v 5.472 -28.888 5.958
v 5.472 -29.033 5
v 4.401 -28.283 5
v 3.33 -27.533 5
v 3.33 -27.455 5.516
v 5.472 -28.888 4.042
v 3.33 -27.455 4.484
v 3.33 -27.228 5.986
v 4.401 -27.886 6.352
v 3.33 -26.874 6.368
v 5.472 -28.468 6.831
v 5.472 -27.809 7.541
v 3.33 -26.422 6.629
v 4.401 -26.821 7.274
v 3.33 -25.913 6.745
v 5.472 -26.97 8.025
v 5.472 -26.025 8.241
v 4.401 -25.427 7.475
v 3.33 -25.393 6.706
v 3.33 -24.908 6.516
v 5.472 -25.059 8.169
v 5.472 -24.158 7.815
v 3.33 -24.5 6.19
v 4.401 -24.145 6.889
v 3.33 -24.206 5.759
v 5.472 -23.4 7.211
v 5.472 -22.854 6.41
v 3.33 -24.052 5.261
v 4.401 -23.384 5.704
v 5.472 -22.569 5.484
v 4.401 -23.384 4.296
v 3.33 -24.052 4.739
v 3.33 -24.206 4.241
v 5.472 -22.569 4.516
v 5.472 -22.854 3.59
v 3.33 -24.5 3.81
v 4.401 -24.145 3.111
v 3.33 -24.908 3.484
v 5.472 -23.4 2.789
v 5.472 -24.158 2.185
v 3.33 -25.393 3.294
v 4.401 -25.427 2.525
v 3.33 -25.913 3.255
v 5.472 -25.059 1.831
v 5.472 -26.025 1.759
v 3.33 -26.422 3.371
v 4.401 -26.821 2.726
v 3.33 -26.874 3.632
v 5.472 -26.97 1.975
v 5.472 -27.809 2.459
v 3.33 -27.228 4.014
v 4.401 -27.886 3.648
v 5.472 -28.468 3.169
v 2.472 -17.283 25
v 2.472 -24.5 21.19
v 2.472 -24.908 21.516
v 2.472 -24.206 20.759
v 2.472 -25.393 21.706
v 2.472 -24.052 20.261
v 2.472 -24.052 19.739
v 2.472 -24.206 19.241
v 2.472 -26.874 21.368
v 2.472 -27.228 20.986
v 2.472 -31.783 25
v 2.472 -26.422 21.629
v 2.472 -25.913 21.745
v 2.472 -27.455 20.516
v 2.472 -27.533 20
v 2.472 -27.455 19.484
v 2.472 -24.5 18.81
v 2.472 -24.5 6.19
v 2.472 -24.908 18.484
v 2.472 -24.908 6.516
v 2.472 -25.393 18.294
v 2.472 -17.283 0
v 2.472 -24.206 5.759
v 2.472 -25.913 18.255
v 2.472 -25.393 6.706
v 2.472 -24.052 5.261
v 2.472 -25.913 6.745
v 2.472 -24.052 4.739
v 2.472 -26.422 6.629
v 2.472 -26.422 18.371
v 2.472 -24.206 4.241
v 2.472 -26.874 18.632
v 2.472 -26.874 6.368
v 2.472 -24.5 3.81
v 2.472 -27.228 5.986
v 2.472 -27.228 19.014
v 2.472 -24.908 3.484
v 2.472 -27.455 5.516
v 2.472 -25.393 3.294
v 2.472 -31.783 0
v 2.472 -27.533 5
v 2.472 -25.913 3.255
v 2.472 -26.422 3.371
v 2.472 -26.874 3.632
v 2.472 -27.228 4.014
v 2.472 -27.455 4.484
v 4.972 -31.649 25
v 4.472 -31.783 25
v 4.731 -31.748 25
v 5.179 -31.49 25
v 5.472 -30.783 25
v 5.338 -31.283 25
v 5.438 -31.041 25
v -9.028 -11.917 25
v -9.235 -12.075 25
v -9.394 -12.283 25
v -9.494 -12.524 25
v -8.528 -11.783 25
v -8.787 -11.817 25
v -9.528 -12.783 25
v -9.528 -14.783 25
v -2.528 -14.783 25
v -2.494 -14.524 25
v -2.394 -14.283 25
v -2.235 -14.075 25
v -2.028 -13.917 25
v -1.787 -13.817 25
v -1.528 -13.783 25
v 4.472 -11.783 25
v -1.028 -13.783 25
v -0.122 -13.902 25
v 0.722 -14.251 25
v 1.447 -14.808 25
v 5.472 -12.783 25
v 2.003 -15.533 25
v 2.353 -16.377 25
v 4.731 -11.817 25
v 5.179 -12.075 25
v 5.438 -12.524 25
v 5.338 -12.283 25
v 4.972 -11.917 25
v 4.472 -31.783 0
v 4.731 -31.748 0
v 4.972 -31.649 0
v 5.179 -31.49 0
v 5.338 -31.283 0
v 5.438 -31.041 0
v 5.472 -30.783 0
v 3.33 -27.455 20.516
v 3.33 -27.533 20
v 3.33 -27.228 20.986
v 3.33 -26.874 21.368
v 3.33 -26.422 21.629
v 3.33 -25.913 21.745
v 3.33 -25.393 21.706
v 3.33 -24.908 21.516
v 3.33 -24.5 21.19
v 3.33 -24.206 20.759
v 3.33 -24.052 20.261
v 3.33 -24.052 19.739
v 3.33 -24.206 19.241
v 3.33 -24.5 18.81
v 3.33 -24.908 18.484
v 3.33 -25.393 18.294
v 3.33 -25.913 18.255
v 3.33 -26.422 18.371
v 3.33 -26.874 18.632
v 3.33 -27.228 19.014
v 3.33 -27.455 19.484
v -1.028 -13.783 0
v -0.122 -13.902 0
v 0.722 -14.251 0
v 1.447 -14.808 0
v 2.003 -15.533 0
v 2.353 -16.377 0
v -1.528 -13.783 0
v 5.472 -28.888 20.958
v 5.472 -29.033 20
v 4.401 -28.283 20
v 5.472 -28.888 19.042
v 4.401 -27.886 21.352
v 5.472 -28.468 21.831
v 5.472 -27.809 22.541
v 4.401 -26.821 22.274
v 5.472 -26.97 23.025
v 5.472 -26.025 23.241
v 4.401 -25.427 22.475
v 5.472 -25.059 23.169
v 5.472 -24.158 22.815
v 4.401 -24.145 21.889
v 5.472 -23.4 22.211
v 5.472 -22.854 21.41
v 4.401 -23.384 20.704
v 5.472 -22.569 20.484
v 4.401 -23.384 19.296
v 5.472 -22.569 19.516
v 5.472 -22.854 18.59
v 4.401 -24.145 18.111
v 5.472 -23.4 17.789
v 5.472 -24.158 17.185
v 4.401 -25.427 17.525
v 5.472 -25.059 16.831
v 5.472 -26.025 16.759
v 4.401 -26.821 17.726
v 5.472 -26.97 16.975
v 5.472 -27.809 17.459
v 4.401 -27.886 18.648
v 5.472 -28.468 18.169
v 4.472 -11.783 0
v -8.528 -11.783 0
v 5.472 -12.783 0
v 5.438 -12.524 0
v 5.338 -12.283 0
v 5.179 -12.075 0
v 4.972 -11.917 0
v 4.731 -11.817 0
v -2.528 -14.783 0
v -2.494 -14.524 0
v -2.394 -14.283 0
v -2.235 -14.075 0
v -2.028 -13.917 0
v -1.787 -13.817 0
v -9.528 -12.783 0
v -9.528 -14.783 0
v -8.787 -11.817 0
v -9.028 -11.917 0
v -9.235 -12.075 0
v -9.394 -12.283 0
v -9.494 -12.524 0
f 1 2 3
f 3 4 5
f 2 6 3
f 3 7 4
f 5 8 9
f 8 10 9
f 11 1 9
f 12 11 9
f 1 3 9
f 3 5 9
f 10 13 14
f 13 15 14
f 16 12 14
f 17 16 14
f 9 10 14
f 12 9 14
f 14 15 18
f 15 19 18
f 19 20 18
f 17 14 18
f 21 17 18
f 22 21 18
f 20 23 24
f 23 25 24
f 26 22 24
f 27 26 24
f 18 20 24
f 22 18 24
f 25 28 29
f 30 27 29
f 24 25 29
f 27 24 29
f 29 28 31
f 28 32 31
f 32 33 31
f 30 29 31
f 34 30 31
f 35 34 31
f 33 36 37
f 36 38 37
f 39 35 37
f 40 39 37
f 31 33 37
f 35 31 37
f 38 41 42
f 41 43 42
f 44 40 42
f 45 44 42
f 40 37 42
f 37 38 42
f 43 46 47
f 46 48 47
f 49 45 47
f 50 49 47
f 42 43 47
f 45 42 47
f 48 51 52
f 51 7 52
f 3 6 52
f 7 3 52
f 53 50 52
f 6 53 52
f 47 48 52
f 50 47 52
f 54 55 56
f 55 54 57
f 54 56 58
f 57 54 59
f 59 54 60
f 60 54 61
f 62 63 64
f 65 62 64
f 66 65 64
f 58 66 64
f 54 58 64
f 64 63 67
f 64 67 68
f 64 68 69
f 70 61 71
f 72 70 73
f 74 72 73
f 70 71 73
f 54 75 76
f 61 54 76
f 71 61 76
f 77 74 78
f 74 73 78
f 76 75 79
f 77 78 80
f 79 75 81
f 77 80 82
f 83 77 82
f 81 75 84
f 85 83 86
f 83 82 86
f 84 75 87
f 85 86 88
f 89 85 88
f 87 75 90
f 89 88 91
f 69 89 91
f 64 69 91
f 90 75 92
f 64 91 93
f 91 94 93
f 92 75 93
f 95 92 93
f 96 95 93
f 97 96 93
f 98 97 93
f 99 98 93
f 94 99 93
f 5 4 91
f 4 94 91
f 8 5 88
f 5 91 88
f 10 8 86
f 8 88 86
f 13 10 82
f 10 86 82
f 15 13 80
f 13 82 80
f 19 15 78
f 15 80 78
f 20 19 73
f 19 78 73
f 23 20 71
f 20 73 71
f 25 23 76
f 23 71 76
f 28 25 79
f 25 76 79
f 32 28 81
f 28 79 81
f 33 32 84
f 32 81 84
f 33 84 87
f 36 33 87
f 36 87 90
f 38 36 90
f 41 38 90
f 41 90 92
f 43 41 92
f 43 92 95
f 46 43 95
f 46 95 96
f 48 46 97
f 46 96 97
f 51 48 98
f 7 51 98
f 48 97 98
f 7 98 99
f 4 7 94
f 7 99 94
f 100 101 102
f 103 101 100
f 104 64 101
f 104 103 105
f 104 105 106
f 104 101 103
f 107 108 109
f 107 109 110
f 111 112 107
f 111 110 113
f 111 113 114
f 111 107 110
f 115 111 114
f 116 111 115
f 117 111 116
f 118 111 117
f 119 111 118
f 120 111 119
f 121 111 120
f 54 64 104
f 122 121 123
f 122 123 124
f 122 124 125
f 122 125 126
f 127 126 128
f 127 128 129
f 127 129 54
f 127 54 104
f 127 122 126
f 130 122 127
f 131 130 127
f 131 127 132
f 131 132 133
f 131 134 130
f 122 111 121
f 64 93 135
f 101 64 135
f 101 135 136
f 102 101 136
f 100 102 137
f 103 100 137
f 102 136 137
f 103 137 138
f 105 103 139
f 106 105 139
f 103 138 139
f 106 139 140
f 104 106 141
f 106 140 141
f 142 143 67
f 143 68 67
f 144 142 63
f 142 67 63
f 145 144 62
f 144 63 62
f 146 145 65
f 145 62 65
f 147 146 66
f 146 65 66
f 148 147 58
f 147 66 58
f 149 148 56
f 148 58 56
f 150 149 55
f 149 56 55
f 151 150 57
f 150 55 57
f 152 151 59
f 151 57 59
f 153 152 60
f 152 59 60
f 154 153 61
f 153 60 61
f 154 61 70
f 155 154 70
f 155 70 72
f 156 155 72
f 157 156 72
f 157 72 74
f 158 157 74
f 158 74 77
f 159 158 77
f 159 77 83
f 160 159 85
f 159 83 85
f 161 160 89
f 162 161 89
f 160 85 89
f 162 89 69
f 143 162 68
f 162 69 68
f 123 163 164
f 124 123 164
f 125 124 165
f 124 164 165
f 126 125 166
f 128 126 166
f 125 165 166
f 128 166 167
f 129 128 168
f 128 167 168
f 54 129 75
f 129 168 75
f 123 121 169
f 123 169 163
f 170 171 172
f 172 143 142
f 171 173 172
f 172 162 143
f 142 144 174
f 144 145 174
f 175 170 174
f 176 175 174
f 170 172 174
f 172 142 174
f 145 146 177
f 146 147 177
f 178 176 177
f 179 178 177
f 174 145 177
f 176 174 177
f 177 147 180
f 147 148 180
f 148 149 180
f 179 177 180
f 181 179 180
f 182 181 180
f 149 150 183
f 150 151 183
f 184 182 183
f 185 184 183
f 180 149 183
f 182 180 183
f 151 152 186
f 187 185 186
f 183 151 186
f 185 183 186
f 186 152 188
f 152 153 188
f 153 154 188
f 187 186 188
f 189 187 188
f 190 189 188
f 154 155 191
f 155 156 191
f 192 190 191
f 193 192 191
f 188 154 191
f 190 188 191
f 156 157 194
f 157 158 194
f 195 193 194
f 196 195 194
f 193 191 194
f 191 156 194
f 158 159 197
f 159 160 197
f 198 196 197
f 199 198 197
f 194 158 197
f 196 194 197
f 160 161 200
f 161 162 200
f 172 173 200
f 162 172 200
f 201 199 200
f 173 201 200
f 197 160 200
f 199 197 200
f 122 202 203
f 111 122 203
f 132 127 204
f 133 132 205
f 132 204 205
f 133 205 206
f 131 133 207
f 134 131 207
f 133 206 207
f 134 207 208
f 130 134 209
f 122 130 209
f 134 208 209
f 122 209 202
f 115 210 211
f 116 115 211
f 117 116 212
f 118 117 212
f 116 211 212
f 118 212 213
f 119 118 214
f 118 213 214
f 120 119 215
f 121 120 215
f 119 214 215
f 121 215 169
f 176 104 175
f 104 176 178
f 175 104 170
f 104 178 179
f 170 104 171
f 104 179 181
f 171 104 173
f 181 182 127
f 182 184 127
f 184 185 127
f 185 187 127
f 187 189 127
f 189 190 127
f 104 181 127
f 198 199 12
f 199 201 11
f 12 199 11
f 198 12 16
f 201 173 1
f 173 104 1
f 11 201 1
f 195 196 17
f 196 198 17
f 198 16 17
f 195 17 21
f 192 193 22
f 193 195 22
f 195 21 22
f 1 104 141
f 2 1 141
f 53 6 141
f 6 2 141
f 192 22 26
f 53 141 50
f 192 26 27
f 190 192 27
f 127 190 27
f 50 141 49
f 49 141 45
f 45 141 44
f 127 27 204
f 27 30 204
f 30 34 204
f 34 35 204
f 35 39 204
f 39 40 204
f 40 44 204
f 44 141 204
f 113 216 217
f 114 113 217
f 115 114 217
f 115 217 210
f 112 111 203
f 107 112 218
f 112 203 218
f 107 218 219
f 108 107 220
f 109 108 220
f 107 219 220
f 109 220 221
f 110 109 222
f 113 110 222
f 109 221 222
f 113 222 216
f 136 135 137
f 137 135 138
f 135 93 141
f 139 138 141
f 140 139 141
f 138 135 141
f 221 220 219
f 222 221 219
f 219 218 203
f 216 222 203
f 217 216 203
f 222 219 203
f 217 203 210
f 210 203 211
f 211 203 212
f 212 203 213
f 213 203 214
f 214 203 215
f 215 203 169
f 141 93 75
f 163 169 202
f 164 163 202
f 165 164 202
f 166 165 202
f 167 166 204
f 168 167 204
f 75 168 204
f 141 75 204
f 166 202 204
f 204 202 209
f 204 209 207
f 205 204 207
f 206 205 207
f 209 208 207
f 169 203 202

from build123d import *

# Parameters (mm, degrees)
F1_DEPTH       = 25
F3_D           = 3.5
F3_CSINK_D     = 6.5
F3_CSINK_ANGLE = 70


with BuildPart() as f1:
    # F0 (on Top) → F1 (new body)
    with BuildSketch(Plane.XY):
        with BuildLine():
            Line((4.472217, -11.782544), (-8.527783, -11.782544))
            ThreePointArc((-8.527783, -11.782544), (-9.23489, -12.075437), (-9.527783, -12.782544))
            Line((-9.527783, -12.782544), (-9.527783, -14.782544))
            Line((-9.527783, -14.782544), (-2.527783, -14.782544))
            ThreePointArc((-2.527783, -14.782544), (-2.23489, -14.075437), (-1.527783, -13.782544))
            Line((-1.527783, -13.782544), (-1.027783, -13.782544))
            ThreePointArc((-1.027783, -13.782544), (1.447091, -14.80767), (2.472217, -17.282544))
            Line((2.472217, -17.282544), (2.472217, -31.782544))
            Line((2.472217, -31.782544), (4.472217, -31.782544))
            ThreePointArc((4.472217, -31.782544), (5.179324, -31.489651), (5.472217, -30.782544))
            Line((5.472217, -30.782544), (5.472217, -12.782544))
            ThreePointArc((5.472217, -12.782544), (5.179324, -12.075437), (4.472217, -11.782544))
        make_face()
    extrude(amount=F1_DEPTH)

    # F3 (through all)
    with Locations(Plane.YZ.offset(5.472217)):
        with Locations((-25.782544, 20), (-25.782544, 5)):
            CounterSinkHole(F3_D / 2, F3_CSINK_D / 2, counter_sink_angle=F3_CSINK_ANGLE)


solid = f1.part
